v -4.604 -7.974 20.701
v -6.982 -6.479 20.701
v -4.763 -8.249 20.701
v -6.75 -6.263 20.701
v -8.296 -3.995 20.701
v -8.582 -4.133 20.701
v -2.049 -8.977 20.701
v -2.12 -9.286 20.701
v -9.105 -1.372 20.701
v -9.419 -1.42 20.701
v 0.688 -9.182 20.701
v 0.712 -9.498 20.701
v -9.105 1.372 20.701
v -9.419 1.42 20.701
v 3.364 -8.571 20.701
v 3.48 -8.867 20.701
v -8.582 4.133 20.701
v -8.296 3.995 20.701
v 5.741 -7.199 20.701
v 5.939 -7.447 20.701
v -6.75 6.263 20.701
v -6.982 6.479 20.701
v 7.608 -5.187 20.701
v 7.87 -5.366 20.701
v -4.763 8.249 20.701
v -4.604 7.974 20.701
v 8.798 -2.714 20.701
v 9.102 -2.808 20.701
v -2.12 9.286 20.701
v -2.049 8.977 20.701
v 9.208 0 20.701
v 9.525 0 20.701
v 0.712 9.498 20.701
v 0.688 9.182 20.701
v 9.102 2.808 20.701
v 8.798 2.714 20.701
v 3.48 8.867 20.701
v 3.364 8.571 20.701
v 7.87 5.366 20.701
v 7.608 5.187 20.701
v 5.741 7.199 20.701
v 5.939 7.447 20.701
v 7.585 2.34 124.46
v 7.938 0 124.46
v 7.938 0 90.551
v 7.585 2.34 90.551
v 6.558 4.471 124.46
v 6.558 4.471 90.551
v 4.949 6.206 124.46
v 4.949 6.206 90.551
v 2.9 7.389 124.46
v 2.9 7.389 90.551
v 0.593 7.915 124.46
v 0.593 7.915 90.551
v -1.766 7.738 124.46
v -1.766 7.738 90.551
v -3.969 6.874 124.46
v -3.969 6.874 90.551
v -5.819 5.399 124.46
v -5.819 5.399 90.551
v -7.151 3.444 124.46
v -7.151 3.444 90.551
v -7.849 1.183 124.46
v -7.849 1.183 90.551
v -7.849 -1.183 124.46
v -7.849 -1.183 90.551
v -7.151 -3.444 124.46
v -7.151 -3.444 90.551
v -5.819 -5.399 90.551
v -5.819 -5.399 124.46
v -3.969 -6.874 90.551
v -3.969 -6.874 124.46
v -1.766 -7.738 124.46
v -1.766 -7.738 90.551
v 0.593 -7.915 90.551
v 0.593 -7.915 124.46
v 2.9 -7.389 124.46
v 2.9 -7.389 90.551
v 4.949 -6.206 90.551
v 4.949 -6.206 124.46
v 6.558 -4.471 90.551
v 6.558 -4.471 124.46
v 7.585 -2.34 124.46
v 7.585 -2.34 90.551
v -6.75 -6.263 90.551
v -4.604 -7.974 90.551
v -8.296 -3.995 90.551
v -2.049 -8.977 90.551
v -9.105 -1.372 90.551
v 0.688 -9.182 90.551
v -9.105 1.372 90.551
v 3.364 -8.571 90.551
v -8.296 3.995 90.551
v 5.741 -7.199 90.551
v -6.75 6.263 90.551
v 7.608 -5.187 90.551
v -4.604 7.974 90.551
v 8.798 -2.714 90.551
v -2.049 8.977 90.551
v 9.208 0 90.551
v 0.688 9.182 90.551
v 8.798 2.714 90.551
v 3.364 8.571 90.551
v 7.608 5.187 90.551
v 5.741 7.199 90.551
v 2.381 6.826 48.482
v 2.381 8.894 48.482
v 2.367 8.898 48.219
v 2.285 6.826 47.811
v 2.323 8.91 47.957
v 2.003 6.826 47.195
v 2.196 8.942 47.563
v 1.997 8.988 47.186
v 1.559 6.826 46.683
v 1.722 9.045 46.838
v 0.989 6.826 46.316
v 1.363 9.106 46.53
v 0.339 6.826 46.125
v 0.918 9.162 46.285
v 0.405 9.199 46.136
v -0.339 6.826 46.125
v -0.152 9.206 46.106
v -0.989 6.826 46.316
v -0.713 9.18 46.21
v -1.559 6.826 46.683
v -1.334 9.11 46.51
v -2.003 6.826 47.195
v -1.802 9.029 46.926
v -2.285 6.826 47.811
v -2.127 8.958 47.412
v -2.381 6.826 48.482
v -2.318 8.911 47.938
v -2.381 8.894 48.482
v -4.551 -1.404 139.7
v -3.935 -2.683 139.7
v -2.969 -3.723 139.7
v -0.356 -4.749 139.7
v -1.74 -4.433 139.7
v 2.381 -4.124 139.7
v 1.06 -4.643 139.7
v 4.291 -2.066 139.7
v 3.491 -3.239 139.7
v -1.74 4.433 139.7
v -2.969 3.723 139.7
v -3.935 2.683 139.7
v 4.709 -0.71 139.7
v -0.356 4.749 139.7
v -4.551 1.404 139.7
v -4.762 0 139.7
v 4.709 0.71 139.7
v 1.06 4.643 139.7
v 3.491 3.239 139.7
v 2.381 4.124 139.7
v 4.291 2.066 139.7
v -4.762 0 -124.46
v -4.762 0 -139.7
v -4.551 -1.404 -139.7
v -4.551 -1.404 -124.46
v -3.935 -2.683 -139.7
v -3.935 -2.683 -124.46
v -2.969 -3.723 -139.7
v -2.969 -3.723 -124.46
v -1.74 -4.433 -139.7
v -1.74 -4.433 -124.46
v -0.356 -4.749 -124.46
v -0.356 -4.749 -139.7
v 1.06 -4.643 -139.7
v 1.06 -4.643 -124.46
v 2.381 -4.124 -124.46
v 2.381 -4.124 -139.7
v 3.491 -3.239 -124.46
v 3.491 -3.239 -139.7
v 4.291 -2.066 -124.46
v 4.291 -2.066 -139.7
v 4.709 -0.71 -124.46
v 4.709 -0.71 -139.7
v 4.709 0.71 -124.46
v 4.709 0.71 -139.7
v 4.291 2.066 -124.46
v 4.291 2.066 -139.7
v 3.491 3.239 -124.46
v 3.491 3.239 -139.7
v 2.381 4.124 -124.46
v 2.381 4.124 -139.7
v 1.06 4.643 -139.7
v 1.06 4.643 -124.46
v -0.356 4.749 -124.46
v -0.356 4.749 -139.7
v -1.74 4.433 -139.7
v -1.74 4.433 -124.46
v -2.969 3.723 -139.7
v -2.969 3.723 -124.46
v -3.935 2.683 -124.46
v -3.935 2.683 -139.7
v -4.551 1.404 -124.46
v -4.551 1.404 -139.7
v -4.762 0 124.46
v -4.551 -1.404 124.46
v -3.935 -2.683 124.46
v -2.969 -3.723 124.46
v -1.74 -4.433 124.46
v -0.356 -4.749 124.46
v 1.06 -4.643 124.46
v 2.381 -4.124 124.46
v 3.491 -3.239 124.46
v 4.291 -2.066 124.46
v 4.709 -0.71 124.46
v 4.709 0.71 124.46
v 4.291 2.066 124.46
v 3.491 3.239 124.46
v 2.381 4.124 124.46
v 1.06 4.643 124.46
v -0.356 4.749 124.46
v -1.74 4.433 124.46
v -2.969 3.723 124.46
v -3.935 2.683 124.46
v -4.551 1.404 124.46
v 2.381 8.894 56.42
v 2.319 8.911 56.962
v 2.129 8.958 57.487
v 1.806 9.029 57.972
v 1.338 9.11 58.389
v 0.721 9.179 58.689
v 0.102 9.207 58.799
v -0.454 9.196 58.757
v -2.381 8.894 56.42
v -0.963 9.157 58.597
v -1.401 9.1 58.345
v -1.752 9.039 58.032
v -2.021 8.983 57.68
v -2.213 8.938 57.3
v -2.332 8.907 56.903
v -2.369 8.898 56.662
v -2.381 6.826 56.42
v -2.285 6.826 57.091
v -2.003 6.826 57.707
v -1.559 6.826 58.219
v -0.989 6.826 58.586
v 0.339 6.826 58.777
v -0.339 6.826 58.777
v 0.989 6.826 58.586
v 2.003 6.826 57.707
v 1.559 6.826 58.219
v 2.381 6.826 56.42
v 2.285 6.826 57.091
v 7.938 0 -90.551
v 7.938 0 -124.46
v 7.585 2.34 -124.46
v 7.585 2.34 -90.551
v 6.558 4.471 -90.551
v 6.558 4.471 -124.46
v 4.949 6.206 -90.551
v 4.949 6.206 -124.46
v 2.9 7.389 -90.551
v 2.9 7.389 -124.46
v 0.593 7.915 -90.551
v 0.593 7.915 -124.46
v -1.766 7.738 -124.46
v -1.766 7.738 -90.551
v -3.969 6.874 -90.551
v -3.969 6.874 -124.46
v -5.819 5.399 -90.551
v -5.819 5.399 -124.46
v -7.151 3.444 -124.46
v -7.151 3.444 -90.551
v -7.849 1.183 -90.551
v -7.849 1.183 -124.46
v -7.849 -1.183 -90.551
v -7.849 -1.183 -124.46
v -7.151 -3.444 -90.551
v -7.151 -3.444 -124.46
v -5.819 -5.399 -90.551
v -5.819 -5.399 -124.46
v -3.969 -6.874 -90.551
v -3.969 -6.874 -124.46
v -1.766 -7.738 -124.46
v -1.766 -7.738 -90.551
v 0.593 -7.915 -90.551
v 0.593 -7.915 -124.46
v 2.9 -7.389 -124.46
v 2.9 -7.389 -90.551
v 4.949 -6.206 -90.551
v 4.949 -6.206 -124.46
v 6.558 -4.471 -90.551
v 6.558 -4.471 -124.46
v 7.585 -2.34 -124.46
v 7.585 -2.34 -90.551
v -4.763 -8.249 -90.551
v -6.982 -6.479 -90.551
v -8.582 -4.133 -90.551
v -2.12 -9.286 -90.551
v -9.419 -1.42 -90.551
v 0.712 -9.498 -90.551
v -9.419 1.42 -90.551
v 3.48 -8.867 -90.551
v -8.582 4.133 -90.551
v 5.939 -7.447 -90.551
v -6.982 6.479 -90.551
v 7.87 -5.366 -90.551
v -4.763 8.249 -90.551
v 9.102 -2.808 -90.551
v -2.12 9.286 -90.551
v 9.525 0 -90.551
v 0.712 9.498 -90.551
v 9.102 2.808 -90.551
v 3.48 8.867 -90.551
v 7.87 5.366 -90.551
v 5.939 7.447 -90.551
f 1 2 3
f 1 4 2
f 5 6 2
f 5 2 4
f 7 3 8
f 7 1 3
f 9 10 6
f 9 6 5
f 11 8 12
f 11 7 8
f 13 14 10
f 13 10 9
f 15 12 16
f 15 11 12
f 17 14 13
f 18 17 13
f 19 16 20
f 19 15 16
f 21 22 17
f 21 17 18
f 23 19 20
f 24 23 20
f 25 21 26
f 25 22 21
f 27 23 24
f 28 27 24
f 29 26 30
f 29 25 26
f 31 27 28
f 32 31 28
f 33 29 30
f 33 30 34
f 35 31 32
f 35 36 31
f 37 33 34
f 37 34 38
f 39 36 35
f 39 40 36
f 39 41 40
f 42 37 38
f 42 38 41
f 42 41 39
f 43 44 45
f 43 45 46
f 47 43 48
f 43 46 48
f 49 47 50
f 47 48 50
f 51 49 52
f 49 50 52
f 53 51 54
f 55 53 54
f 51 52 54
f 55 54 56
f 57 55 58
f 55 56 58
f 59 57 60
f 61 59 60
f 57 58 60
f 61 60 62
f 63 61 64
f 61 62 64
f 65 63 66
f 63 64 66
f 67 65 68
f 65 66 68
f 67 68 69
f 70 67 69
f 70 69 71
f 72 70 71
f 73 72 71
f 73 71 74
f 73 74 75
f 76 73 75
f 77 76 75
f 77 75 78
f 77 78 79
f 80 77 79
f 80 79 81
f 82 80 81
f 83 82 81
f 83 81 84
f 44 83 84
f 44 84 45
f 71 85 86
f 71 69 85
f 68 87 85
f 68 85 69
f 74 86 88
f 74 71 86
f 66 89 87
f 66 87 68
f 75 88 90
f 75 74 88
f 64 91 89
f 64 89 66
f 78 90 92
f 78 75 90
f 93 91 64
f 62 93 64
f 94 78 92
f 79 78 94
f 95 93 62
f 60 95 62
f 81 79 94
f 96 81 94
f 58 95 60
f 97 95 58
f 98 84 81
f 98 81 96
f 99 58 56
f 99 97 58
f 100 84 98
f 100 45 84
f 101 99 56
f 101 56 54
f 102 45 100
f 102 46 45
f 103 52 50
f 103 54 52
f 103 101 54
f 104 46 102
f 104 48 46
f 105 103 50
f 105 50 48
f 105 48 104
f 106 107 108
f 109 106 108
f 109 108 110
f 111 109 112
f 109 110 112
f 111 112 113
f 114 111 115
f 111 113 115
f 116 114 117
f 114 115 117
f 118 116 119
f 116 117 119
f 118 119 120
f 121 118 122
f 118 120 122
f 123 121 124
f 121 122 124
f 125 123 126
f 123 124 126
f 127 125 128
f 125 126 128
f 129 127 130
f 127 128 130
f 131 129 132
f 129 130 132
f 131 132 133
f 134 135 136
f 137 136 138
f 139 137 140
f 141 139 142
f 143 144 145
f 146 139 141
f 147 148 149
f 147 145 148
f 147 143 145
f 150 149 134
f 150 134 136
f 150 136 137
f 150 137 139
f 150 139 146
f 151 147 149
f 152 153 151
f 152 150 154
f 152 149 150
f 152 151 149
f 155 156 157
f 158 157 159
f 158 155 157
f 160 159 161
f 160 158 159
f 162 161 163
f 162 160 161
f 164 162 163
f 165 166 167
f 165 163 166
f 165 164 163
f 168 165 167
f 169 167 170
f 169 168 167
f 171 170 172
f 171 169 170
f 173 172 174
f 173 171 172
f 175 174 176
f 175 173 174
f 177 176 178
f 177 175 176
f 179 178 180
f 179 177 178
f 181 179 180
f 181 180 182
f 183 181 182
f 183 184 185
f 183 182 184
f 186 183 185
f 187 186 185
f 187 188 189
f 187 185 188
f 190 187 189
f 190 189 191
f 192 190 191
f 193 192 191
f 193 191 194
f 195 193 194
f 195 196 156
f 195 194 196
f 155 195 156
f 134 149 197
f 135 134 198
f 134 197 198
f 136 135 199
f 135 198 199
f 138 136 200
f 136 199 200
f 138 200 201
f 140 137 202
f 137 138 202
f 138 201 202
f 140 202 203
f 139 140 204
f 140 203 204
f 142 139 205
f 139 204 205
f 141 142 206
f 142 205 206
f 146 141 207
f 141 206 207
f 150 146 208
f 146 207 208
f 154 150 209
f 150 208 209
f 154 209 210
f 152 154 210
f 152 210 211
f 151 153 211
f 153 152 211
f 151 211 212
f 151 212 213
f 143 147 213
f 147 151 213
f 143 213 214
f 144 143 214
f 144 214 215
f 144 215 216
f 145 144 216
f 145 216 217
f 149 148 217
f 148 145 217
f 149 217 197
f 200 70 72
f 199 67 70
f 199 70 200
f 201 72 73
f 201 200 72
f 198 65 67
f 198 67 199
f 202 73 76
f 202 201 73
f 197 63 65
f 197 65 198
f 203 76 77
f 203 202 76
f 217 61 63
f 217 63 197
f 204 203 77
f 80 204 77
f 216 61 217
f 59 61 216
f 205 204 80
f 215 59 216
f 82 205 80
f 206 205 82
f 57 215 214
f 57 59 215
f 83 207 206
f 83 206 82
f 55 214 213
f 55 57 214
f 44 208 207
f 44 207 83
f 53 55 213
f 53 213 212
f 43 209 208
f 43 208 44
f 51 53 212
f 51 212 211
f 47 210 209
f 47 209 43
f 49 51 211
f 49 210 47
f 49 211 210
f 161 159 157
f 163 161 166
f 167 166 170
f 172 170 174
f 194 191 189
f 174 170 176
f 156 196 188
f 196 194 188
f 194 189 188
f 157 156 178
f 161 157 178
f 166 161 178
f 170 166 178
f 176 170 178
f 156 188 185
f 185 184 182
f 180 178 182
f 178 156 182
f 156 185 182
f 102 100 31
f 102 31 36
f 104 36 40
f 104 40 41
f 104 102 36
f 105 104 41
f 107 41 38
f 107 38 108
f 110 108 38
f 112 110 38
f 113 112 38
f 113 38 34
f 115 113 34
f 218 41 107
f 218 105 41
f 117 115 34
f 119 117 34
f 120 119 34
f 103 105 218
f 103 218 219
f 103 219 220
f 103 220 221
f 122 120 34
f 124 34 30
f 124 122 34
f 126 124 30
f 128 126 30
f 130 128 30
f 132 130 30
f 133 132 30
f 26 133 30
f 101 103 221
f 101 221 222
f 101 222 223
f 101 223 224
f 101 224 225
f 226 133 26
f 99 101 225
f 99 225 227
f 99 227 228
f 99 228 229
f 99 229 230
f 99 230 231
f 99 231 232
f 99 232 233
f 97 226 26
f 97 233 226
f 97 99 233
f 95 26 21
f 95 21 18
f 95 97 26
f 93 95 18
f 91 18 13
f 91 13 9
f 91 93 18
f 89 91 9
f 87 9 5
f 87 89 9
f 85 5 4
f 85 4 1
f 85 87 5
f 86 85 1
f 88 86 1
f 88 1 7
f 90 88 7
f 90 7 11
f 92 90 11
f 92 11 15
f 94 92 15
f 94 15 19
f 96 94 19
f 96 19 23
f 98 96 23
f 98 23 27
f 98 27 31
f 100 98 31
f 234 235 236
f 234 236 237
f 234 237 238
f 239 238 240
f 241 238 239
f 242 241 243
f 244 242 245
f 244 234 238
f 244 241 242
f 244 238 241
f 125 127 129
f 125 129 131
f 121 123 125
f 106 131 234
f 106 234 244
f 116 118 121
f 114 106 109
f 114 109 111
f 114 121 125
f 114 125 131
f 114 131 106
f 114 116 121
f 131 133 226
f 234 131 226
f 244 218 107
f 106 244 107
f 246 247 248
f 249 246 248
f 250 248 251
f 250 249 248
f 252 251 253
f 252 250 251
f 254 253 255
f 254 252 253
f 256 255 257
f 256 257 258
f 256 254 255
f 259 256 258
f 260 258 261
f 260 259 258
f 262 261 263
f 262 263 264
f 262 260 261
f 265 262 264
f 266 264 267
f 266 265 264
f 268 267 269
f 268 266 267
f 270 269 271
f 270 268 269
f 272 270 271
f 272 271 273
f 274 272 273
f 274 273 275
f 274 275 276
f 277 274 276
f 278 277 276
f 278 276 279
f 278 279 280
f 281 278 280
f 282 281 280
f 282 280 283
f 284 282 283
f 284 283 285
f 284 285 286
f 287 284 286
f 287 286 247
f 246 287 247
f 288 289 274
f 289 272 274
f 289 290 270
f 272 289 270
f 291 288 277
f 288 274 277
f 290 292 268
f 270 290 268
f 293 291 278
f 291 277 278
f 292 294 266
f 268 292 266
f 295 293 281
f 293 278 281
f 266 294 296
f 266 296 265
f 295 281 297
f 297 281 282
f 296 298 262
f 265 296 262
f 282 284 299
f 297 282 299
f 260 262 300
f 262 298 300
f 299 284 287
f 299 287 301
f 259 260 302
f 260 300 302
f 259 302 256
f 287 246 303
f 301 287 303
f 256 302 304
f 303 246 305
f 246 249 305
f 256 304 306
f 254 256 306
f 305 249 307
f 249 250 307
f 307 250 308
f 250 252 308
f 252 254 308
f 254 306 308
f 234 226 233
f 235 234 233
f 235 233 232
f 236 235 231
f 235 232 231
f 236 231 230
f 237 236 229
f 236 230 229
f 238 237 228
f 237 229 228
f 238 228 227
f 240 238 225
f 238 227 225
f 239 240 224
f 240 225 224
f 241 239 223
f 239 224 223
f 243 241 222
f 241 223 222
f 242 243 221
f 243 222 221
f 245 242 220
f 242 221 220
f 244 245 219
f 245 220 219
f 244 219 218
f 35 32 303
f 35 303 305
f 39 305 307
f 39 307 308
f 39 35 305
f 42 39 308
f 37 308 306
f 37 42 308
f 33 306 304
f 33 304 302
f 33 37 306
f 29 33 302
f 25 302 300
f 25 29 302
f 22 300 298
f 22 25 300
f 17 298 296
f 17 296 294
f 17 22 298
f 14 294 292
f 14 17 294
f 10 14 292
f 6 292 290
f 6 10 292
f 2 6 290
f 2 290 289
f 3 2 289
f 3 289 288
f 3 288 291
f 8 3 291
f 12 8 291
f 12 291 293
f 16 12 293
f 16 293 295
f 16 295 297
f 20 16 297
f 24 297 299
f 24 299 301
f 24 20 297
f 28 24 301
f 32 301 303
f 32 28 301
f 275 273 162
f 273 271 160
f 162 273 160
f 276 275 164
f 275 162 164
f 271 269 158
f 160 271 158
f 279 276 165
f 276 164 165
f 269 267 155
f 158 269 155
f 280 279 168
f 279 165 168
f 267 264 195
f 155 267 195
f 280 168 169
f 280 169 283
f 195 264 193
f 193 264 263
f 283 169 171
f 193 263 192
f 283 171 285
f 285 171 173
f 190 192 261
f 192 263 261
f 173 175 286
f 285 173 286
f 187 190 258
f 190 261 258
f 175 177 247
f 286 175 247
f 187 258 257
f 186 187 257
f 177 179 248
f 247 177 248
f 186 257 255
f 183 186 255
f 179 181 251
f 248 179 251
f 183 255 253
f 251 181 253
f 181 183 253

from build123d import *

# Parameters (mm, degrees)
SKETCH1_R           = 9.525
BOSS_EXTRUDE1_DEPTH = 139.7
CUT_EXTRUDE1_REACH  = 232.645
SKETCH3_R           = 9.525
SKETCH3_R_2         = 7.9375
CUT_EXTRUDE2_REACH  = 266.503
SKETCH4_R           = 7.9375
SKETCH4_R_2         = 4.7625
SKETCH5_R           = 9.525
SKETCH5_R_2         = 9.2075
CUT_EXTRUDE3_DEPTH  = 69.85
CUT_EXTRUDE4_DEPTH  = 2.38125


with BuildPart() as part:
    # Sketch1 → Boss-Extrude1 (new, symmetric)
    with BuildSketch(Plane.XY):
        Circle(SKETCH1_R)
    extrude(amount=BOSS_EXTRUDE1_DEPTH, both=True)

    # Sketch3 → Cut-Extrude1 (cut, up to next)
    with BuildSketch(Plane.XY.offset(90.551), mode=Mode.PRIVATE) as cut_extrude1_sk1:
        Circle(SKETCH3_R)
        Circle(SKETCH3_R_2, mode=Mode.SUBTRACT)
    cut_extrude1_tool1 = extrude(cut_extrude1_sk1.sketch, amount=CUT_EXTRUDE1_REACH, mode=Mode.PRIVATE) & part.part
    cut_extrude1 = cut_extrude1_tool1.solids().sort_by_distance((-9.255592, 0, 90.551))[0]
    add(cut_extrude1, mode=Mode.SUBTRACT)

    # Mirror1: Cut-Extrude1 across plane
    add(cut_extrude1.mirror(Plane.XY), mode=Mode.SUBTRACT)

    # Sketch4 → Cut-Extrude2 (cut, up to next)
    with BuildSketch(Plane.XY.offset(124.46), mode=Mode.PRIVATE) as cut_extrude2_sk1:
        Circle(SKETCH4_R)
        with Locations(Location((0, 0, 0), (0, 0, 180))):
            Circle(SKETCH4_R_2, mode=Mode.SUBTRACT)
    cut_extrude2_tool1 = extrude(cut_extrude2_sk1.sketch, amount=CUT_EXTRUDE2_REACH, mode=Mode.PRIVATE) & part.part
    cut_extrude2 = cut_extrude2_tool1.solids().sort_by_distance((-7.712994, 0, 124.46))[0]
    add(cut_extrude2, mode=Mode.SUBTRACT)

    # Mirror2: Cut-Extrude2 across plane
    add(cut_extrude2.mirror(Plane.XY), mode=Mode.SUBTRACT)

    # Sketch5 → Cut-Extrude3 (cut)
    with BuildSketch(Plane.XY.offset(90.551)):
        Circle(SKETCH5_R)
        Circle(SKETCH5_R_2, mode=Mode.SUBTRACT)
    extrude(amount=-CUT_EXTRUDE3_DEPTH, mode=Mode.SUBTRACT)

    # Sketch6 → Cut-Extrude4 (cut)
    with BuildSketch(Plane(origin=(0, 9.2075, 0), x_dir=(1, 0, 0), z_dir=(0, 1, 0))):
        with BuildLine():
            Line((2.38125, -56.41975), (2.38125, -48.48225))
            ThreePointArc((2.38125, -48.48225), (0, -46.101), (-2.38125, -48.48225))
            Line((-2.38125, -48.48225), (-2.38125, -56.41975))
            ThreePointArc((-2.38125, -56.41975), (0, -58.801), (2.38125, -56.41975))
        make_face()
    extrude(amount=-CUT_EXTRUDE4_DEPTH, mode=Mode.SUBTRACT)


solid = part.part
